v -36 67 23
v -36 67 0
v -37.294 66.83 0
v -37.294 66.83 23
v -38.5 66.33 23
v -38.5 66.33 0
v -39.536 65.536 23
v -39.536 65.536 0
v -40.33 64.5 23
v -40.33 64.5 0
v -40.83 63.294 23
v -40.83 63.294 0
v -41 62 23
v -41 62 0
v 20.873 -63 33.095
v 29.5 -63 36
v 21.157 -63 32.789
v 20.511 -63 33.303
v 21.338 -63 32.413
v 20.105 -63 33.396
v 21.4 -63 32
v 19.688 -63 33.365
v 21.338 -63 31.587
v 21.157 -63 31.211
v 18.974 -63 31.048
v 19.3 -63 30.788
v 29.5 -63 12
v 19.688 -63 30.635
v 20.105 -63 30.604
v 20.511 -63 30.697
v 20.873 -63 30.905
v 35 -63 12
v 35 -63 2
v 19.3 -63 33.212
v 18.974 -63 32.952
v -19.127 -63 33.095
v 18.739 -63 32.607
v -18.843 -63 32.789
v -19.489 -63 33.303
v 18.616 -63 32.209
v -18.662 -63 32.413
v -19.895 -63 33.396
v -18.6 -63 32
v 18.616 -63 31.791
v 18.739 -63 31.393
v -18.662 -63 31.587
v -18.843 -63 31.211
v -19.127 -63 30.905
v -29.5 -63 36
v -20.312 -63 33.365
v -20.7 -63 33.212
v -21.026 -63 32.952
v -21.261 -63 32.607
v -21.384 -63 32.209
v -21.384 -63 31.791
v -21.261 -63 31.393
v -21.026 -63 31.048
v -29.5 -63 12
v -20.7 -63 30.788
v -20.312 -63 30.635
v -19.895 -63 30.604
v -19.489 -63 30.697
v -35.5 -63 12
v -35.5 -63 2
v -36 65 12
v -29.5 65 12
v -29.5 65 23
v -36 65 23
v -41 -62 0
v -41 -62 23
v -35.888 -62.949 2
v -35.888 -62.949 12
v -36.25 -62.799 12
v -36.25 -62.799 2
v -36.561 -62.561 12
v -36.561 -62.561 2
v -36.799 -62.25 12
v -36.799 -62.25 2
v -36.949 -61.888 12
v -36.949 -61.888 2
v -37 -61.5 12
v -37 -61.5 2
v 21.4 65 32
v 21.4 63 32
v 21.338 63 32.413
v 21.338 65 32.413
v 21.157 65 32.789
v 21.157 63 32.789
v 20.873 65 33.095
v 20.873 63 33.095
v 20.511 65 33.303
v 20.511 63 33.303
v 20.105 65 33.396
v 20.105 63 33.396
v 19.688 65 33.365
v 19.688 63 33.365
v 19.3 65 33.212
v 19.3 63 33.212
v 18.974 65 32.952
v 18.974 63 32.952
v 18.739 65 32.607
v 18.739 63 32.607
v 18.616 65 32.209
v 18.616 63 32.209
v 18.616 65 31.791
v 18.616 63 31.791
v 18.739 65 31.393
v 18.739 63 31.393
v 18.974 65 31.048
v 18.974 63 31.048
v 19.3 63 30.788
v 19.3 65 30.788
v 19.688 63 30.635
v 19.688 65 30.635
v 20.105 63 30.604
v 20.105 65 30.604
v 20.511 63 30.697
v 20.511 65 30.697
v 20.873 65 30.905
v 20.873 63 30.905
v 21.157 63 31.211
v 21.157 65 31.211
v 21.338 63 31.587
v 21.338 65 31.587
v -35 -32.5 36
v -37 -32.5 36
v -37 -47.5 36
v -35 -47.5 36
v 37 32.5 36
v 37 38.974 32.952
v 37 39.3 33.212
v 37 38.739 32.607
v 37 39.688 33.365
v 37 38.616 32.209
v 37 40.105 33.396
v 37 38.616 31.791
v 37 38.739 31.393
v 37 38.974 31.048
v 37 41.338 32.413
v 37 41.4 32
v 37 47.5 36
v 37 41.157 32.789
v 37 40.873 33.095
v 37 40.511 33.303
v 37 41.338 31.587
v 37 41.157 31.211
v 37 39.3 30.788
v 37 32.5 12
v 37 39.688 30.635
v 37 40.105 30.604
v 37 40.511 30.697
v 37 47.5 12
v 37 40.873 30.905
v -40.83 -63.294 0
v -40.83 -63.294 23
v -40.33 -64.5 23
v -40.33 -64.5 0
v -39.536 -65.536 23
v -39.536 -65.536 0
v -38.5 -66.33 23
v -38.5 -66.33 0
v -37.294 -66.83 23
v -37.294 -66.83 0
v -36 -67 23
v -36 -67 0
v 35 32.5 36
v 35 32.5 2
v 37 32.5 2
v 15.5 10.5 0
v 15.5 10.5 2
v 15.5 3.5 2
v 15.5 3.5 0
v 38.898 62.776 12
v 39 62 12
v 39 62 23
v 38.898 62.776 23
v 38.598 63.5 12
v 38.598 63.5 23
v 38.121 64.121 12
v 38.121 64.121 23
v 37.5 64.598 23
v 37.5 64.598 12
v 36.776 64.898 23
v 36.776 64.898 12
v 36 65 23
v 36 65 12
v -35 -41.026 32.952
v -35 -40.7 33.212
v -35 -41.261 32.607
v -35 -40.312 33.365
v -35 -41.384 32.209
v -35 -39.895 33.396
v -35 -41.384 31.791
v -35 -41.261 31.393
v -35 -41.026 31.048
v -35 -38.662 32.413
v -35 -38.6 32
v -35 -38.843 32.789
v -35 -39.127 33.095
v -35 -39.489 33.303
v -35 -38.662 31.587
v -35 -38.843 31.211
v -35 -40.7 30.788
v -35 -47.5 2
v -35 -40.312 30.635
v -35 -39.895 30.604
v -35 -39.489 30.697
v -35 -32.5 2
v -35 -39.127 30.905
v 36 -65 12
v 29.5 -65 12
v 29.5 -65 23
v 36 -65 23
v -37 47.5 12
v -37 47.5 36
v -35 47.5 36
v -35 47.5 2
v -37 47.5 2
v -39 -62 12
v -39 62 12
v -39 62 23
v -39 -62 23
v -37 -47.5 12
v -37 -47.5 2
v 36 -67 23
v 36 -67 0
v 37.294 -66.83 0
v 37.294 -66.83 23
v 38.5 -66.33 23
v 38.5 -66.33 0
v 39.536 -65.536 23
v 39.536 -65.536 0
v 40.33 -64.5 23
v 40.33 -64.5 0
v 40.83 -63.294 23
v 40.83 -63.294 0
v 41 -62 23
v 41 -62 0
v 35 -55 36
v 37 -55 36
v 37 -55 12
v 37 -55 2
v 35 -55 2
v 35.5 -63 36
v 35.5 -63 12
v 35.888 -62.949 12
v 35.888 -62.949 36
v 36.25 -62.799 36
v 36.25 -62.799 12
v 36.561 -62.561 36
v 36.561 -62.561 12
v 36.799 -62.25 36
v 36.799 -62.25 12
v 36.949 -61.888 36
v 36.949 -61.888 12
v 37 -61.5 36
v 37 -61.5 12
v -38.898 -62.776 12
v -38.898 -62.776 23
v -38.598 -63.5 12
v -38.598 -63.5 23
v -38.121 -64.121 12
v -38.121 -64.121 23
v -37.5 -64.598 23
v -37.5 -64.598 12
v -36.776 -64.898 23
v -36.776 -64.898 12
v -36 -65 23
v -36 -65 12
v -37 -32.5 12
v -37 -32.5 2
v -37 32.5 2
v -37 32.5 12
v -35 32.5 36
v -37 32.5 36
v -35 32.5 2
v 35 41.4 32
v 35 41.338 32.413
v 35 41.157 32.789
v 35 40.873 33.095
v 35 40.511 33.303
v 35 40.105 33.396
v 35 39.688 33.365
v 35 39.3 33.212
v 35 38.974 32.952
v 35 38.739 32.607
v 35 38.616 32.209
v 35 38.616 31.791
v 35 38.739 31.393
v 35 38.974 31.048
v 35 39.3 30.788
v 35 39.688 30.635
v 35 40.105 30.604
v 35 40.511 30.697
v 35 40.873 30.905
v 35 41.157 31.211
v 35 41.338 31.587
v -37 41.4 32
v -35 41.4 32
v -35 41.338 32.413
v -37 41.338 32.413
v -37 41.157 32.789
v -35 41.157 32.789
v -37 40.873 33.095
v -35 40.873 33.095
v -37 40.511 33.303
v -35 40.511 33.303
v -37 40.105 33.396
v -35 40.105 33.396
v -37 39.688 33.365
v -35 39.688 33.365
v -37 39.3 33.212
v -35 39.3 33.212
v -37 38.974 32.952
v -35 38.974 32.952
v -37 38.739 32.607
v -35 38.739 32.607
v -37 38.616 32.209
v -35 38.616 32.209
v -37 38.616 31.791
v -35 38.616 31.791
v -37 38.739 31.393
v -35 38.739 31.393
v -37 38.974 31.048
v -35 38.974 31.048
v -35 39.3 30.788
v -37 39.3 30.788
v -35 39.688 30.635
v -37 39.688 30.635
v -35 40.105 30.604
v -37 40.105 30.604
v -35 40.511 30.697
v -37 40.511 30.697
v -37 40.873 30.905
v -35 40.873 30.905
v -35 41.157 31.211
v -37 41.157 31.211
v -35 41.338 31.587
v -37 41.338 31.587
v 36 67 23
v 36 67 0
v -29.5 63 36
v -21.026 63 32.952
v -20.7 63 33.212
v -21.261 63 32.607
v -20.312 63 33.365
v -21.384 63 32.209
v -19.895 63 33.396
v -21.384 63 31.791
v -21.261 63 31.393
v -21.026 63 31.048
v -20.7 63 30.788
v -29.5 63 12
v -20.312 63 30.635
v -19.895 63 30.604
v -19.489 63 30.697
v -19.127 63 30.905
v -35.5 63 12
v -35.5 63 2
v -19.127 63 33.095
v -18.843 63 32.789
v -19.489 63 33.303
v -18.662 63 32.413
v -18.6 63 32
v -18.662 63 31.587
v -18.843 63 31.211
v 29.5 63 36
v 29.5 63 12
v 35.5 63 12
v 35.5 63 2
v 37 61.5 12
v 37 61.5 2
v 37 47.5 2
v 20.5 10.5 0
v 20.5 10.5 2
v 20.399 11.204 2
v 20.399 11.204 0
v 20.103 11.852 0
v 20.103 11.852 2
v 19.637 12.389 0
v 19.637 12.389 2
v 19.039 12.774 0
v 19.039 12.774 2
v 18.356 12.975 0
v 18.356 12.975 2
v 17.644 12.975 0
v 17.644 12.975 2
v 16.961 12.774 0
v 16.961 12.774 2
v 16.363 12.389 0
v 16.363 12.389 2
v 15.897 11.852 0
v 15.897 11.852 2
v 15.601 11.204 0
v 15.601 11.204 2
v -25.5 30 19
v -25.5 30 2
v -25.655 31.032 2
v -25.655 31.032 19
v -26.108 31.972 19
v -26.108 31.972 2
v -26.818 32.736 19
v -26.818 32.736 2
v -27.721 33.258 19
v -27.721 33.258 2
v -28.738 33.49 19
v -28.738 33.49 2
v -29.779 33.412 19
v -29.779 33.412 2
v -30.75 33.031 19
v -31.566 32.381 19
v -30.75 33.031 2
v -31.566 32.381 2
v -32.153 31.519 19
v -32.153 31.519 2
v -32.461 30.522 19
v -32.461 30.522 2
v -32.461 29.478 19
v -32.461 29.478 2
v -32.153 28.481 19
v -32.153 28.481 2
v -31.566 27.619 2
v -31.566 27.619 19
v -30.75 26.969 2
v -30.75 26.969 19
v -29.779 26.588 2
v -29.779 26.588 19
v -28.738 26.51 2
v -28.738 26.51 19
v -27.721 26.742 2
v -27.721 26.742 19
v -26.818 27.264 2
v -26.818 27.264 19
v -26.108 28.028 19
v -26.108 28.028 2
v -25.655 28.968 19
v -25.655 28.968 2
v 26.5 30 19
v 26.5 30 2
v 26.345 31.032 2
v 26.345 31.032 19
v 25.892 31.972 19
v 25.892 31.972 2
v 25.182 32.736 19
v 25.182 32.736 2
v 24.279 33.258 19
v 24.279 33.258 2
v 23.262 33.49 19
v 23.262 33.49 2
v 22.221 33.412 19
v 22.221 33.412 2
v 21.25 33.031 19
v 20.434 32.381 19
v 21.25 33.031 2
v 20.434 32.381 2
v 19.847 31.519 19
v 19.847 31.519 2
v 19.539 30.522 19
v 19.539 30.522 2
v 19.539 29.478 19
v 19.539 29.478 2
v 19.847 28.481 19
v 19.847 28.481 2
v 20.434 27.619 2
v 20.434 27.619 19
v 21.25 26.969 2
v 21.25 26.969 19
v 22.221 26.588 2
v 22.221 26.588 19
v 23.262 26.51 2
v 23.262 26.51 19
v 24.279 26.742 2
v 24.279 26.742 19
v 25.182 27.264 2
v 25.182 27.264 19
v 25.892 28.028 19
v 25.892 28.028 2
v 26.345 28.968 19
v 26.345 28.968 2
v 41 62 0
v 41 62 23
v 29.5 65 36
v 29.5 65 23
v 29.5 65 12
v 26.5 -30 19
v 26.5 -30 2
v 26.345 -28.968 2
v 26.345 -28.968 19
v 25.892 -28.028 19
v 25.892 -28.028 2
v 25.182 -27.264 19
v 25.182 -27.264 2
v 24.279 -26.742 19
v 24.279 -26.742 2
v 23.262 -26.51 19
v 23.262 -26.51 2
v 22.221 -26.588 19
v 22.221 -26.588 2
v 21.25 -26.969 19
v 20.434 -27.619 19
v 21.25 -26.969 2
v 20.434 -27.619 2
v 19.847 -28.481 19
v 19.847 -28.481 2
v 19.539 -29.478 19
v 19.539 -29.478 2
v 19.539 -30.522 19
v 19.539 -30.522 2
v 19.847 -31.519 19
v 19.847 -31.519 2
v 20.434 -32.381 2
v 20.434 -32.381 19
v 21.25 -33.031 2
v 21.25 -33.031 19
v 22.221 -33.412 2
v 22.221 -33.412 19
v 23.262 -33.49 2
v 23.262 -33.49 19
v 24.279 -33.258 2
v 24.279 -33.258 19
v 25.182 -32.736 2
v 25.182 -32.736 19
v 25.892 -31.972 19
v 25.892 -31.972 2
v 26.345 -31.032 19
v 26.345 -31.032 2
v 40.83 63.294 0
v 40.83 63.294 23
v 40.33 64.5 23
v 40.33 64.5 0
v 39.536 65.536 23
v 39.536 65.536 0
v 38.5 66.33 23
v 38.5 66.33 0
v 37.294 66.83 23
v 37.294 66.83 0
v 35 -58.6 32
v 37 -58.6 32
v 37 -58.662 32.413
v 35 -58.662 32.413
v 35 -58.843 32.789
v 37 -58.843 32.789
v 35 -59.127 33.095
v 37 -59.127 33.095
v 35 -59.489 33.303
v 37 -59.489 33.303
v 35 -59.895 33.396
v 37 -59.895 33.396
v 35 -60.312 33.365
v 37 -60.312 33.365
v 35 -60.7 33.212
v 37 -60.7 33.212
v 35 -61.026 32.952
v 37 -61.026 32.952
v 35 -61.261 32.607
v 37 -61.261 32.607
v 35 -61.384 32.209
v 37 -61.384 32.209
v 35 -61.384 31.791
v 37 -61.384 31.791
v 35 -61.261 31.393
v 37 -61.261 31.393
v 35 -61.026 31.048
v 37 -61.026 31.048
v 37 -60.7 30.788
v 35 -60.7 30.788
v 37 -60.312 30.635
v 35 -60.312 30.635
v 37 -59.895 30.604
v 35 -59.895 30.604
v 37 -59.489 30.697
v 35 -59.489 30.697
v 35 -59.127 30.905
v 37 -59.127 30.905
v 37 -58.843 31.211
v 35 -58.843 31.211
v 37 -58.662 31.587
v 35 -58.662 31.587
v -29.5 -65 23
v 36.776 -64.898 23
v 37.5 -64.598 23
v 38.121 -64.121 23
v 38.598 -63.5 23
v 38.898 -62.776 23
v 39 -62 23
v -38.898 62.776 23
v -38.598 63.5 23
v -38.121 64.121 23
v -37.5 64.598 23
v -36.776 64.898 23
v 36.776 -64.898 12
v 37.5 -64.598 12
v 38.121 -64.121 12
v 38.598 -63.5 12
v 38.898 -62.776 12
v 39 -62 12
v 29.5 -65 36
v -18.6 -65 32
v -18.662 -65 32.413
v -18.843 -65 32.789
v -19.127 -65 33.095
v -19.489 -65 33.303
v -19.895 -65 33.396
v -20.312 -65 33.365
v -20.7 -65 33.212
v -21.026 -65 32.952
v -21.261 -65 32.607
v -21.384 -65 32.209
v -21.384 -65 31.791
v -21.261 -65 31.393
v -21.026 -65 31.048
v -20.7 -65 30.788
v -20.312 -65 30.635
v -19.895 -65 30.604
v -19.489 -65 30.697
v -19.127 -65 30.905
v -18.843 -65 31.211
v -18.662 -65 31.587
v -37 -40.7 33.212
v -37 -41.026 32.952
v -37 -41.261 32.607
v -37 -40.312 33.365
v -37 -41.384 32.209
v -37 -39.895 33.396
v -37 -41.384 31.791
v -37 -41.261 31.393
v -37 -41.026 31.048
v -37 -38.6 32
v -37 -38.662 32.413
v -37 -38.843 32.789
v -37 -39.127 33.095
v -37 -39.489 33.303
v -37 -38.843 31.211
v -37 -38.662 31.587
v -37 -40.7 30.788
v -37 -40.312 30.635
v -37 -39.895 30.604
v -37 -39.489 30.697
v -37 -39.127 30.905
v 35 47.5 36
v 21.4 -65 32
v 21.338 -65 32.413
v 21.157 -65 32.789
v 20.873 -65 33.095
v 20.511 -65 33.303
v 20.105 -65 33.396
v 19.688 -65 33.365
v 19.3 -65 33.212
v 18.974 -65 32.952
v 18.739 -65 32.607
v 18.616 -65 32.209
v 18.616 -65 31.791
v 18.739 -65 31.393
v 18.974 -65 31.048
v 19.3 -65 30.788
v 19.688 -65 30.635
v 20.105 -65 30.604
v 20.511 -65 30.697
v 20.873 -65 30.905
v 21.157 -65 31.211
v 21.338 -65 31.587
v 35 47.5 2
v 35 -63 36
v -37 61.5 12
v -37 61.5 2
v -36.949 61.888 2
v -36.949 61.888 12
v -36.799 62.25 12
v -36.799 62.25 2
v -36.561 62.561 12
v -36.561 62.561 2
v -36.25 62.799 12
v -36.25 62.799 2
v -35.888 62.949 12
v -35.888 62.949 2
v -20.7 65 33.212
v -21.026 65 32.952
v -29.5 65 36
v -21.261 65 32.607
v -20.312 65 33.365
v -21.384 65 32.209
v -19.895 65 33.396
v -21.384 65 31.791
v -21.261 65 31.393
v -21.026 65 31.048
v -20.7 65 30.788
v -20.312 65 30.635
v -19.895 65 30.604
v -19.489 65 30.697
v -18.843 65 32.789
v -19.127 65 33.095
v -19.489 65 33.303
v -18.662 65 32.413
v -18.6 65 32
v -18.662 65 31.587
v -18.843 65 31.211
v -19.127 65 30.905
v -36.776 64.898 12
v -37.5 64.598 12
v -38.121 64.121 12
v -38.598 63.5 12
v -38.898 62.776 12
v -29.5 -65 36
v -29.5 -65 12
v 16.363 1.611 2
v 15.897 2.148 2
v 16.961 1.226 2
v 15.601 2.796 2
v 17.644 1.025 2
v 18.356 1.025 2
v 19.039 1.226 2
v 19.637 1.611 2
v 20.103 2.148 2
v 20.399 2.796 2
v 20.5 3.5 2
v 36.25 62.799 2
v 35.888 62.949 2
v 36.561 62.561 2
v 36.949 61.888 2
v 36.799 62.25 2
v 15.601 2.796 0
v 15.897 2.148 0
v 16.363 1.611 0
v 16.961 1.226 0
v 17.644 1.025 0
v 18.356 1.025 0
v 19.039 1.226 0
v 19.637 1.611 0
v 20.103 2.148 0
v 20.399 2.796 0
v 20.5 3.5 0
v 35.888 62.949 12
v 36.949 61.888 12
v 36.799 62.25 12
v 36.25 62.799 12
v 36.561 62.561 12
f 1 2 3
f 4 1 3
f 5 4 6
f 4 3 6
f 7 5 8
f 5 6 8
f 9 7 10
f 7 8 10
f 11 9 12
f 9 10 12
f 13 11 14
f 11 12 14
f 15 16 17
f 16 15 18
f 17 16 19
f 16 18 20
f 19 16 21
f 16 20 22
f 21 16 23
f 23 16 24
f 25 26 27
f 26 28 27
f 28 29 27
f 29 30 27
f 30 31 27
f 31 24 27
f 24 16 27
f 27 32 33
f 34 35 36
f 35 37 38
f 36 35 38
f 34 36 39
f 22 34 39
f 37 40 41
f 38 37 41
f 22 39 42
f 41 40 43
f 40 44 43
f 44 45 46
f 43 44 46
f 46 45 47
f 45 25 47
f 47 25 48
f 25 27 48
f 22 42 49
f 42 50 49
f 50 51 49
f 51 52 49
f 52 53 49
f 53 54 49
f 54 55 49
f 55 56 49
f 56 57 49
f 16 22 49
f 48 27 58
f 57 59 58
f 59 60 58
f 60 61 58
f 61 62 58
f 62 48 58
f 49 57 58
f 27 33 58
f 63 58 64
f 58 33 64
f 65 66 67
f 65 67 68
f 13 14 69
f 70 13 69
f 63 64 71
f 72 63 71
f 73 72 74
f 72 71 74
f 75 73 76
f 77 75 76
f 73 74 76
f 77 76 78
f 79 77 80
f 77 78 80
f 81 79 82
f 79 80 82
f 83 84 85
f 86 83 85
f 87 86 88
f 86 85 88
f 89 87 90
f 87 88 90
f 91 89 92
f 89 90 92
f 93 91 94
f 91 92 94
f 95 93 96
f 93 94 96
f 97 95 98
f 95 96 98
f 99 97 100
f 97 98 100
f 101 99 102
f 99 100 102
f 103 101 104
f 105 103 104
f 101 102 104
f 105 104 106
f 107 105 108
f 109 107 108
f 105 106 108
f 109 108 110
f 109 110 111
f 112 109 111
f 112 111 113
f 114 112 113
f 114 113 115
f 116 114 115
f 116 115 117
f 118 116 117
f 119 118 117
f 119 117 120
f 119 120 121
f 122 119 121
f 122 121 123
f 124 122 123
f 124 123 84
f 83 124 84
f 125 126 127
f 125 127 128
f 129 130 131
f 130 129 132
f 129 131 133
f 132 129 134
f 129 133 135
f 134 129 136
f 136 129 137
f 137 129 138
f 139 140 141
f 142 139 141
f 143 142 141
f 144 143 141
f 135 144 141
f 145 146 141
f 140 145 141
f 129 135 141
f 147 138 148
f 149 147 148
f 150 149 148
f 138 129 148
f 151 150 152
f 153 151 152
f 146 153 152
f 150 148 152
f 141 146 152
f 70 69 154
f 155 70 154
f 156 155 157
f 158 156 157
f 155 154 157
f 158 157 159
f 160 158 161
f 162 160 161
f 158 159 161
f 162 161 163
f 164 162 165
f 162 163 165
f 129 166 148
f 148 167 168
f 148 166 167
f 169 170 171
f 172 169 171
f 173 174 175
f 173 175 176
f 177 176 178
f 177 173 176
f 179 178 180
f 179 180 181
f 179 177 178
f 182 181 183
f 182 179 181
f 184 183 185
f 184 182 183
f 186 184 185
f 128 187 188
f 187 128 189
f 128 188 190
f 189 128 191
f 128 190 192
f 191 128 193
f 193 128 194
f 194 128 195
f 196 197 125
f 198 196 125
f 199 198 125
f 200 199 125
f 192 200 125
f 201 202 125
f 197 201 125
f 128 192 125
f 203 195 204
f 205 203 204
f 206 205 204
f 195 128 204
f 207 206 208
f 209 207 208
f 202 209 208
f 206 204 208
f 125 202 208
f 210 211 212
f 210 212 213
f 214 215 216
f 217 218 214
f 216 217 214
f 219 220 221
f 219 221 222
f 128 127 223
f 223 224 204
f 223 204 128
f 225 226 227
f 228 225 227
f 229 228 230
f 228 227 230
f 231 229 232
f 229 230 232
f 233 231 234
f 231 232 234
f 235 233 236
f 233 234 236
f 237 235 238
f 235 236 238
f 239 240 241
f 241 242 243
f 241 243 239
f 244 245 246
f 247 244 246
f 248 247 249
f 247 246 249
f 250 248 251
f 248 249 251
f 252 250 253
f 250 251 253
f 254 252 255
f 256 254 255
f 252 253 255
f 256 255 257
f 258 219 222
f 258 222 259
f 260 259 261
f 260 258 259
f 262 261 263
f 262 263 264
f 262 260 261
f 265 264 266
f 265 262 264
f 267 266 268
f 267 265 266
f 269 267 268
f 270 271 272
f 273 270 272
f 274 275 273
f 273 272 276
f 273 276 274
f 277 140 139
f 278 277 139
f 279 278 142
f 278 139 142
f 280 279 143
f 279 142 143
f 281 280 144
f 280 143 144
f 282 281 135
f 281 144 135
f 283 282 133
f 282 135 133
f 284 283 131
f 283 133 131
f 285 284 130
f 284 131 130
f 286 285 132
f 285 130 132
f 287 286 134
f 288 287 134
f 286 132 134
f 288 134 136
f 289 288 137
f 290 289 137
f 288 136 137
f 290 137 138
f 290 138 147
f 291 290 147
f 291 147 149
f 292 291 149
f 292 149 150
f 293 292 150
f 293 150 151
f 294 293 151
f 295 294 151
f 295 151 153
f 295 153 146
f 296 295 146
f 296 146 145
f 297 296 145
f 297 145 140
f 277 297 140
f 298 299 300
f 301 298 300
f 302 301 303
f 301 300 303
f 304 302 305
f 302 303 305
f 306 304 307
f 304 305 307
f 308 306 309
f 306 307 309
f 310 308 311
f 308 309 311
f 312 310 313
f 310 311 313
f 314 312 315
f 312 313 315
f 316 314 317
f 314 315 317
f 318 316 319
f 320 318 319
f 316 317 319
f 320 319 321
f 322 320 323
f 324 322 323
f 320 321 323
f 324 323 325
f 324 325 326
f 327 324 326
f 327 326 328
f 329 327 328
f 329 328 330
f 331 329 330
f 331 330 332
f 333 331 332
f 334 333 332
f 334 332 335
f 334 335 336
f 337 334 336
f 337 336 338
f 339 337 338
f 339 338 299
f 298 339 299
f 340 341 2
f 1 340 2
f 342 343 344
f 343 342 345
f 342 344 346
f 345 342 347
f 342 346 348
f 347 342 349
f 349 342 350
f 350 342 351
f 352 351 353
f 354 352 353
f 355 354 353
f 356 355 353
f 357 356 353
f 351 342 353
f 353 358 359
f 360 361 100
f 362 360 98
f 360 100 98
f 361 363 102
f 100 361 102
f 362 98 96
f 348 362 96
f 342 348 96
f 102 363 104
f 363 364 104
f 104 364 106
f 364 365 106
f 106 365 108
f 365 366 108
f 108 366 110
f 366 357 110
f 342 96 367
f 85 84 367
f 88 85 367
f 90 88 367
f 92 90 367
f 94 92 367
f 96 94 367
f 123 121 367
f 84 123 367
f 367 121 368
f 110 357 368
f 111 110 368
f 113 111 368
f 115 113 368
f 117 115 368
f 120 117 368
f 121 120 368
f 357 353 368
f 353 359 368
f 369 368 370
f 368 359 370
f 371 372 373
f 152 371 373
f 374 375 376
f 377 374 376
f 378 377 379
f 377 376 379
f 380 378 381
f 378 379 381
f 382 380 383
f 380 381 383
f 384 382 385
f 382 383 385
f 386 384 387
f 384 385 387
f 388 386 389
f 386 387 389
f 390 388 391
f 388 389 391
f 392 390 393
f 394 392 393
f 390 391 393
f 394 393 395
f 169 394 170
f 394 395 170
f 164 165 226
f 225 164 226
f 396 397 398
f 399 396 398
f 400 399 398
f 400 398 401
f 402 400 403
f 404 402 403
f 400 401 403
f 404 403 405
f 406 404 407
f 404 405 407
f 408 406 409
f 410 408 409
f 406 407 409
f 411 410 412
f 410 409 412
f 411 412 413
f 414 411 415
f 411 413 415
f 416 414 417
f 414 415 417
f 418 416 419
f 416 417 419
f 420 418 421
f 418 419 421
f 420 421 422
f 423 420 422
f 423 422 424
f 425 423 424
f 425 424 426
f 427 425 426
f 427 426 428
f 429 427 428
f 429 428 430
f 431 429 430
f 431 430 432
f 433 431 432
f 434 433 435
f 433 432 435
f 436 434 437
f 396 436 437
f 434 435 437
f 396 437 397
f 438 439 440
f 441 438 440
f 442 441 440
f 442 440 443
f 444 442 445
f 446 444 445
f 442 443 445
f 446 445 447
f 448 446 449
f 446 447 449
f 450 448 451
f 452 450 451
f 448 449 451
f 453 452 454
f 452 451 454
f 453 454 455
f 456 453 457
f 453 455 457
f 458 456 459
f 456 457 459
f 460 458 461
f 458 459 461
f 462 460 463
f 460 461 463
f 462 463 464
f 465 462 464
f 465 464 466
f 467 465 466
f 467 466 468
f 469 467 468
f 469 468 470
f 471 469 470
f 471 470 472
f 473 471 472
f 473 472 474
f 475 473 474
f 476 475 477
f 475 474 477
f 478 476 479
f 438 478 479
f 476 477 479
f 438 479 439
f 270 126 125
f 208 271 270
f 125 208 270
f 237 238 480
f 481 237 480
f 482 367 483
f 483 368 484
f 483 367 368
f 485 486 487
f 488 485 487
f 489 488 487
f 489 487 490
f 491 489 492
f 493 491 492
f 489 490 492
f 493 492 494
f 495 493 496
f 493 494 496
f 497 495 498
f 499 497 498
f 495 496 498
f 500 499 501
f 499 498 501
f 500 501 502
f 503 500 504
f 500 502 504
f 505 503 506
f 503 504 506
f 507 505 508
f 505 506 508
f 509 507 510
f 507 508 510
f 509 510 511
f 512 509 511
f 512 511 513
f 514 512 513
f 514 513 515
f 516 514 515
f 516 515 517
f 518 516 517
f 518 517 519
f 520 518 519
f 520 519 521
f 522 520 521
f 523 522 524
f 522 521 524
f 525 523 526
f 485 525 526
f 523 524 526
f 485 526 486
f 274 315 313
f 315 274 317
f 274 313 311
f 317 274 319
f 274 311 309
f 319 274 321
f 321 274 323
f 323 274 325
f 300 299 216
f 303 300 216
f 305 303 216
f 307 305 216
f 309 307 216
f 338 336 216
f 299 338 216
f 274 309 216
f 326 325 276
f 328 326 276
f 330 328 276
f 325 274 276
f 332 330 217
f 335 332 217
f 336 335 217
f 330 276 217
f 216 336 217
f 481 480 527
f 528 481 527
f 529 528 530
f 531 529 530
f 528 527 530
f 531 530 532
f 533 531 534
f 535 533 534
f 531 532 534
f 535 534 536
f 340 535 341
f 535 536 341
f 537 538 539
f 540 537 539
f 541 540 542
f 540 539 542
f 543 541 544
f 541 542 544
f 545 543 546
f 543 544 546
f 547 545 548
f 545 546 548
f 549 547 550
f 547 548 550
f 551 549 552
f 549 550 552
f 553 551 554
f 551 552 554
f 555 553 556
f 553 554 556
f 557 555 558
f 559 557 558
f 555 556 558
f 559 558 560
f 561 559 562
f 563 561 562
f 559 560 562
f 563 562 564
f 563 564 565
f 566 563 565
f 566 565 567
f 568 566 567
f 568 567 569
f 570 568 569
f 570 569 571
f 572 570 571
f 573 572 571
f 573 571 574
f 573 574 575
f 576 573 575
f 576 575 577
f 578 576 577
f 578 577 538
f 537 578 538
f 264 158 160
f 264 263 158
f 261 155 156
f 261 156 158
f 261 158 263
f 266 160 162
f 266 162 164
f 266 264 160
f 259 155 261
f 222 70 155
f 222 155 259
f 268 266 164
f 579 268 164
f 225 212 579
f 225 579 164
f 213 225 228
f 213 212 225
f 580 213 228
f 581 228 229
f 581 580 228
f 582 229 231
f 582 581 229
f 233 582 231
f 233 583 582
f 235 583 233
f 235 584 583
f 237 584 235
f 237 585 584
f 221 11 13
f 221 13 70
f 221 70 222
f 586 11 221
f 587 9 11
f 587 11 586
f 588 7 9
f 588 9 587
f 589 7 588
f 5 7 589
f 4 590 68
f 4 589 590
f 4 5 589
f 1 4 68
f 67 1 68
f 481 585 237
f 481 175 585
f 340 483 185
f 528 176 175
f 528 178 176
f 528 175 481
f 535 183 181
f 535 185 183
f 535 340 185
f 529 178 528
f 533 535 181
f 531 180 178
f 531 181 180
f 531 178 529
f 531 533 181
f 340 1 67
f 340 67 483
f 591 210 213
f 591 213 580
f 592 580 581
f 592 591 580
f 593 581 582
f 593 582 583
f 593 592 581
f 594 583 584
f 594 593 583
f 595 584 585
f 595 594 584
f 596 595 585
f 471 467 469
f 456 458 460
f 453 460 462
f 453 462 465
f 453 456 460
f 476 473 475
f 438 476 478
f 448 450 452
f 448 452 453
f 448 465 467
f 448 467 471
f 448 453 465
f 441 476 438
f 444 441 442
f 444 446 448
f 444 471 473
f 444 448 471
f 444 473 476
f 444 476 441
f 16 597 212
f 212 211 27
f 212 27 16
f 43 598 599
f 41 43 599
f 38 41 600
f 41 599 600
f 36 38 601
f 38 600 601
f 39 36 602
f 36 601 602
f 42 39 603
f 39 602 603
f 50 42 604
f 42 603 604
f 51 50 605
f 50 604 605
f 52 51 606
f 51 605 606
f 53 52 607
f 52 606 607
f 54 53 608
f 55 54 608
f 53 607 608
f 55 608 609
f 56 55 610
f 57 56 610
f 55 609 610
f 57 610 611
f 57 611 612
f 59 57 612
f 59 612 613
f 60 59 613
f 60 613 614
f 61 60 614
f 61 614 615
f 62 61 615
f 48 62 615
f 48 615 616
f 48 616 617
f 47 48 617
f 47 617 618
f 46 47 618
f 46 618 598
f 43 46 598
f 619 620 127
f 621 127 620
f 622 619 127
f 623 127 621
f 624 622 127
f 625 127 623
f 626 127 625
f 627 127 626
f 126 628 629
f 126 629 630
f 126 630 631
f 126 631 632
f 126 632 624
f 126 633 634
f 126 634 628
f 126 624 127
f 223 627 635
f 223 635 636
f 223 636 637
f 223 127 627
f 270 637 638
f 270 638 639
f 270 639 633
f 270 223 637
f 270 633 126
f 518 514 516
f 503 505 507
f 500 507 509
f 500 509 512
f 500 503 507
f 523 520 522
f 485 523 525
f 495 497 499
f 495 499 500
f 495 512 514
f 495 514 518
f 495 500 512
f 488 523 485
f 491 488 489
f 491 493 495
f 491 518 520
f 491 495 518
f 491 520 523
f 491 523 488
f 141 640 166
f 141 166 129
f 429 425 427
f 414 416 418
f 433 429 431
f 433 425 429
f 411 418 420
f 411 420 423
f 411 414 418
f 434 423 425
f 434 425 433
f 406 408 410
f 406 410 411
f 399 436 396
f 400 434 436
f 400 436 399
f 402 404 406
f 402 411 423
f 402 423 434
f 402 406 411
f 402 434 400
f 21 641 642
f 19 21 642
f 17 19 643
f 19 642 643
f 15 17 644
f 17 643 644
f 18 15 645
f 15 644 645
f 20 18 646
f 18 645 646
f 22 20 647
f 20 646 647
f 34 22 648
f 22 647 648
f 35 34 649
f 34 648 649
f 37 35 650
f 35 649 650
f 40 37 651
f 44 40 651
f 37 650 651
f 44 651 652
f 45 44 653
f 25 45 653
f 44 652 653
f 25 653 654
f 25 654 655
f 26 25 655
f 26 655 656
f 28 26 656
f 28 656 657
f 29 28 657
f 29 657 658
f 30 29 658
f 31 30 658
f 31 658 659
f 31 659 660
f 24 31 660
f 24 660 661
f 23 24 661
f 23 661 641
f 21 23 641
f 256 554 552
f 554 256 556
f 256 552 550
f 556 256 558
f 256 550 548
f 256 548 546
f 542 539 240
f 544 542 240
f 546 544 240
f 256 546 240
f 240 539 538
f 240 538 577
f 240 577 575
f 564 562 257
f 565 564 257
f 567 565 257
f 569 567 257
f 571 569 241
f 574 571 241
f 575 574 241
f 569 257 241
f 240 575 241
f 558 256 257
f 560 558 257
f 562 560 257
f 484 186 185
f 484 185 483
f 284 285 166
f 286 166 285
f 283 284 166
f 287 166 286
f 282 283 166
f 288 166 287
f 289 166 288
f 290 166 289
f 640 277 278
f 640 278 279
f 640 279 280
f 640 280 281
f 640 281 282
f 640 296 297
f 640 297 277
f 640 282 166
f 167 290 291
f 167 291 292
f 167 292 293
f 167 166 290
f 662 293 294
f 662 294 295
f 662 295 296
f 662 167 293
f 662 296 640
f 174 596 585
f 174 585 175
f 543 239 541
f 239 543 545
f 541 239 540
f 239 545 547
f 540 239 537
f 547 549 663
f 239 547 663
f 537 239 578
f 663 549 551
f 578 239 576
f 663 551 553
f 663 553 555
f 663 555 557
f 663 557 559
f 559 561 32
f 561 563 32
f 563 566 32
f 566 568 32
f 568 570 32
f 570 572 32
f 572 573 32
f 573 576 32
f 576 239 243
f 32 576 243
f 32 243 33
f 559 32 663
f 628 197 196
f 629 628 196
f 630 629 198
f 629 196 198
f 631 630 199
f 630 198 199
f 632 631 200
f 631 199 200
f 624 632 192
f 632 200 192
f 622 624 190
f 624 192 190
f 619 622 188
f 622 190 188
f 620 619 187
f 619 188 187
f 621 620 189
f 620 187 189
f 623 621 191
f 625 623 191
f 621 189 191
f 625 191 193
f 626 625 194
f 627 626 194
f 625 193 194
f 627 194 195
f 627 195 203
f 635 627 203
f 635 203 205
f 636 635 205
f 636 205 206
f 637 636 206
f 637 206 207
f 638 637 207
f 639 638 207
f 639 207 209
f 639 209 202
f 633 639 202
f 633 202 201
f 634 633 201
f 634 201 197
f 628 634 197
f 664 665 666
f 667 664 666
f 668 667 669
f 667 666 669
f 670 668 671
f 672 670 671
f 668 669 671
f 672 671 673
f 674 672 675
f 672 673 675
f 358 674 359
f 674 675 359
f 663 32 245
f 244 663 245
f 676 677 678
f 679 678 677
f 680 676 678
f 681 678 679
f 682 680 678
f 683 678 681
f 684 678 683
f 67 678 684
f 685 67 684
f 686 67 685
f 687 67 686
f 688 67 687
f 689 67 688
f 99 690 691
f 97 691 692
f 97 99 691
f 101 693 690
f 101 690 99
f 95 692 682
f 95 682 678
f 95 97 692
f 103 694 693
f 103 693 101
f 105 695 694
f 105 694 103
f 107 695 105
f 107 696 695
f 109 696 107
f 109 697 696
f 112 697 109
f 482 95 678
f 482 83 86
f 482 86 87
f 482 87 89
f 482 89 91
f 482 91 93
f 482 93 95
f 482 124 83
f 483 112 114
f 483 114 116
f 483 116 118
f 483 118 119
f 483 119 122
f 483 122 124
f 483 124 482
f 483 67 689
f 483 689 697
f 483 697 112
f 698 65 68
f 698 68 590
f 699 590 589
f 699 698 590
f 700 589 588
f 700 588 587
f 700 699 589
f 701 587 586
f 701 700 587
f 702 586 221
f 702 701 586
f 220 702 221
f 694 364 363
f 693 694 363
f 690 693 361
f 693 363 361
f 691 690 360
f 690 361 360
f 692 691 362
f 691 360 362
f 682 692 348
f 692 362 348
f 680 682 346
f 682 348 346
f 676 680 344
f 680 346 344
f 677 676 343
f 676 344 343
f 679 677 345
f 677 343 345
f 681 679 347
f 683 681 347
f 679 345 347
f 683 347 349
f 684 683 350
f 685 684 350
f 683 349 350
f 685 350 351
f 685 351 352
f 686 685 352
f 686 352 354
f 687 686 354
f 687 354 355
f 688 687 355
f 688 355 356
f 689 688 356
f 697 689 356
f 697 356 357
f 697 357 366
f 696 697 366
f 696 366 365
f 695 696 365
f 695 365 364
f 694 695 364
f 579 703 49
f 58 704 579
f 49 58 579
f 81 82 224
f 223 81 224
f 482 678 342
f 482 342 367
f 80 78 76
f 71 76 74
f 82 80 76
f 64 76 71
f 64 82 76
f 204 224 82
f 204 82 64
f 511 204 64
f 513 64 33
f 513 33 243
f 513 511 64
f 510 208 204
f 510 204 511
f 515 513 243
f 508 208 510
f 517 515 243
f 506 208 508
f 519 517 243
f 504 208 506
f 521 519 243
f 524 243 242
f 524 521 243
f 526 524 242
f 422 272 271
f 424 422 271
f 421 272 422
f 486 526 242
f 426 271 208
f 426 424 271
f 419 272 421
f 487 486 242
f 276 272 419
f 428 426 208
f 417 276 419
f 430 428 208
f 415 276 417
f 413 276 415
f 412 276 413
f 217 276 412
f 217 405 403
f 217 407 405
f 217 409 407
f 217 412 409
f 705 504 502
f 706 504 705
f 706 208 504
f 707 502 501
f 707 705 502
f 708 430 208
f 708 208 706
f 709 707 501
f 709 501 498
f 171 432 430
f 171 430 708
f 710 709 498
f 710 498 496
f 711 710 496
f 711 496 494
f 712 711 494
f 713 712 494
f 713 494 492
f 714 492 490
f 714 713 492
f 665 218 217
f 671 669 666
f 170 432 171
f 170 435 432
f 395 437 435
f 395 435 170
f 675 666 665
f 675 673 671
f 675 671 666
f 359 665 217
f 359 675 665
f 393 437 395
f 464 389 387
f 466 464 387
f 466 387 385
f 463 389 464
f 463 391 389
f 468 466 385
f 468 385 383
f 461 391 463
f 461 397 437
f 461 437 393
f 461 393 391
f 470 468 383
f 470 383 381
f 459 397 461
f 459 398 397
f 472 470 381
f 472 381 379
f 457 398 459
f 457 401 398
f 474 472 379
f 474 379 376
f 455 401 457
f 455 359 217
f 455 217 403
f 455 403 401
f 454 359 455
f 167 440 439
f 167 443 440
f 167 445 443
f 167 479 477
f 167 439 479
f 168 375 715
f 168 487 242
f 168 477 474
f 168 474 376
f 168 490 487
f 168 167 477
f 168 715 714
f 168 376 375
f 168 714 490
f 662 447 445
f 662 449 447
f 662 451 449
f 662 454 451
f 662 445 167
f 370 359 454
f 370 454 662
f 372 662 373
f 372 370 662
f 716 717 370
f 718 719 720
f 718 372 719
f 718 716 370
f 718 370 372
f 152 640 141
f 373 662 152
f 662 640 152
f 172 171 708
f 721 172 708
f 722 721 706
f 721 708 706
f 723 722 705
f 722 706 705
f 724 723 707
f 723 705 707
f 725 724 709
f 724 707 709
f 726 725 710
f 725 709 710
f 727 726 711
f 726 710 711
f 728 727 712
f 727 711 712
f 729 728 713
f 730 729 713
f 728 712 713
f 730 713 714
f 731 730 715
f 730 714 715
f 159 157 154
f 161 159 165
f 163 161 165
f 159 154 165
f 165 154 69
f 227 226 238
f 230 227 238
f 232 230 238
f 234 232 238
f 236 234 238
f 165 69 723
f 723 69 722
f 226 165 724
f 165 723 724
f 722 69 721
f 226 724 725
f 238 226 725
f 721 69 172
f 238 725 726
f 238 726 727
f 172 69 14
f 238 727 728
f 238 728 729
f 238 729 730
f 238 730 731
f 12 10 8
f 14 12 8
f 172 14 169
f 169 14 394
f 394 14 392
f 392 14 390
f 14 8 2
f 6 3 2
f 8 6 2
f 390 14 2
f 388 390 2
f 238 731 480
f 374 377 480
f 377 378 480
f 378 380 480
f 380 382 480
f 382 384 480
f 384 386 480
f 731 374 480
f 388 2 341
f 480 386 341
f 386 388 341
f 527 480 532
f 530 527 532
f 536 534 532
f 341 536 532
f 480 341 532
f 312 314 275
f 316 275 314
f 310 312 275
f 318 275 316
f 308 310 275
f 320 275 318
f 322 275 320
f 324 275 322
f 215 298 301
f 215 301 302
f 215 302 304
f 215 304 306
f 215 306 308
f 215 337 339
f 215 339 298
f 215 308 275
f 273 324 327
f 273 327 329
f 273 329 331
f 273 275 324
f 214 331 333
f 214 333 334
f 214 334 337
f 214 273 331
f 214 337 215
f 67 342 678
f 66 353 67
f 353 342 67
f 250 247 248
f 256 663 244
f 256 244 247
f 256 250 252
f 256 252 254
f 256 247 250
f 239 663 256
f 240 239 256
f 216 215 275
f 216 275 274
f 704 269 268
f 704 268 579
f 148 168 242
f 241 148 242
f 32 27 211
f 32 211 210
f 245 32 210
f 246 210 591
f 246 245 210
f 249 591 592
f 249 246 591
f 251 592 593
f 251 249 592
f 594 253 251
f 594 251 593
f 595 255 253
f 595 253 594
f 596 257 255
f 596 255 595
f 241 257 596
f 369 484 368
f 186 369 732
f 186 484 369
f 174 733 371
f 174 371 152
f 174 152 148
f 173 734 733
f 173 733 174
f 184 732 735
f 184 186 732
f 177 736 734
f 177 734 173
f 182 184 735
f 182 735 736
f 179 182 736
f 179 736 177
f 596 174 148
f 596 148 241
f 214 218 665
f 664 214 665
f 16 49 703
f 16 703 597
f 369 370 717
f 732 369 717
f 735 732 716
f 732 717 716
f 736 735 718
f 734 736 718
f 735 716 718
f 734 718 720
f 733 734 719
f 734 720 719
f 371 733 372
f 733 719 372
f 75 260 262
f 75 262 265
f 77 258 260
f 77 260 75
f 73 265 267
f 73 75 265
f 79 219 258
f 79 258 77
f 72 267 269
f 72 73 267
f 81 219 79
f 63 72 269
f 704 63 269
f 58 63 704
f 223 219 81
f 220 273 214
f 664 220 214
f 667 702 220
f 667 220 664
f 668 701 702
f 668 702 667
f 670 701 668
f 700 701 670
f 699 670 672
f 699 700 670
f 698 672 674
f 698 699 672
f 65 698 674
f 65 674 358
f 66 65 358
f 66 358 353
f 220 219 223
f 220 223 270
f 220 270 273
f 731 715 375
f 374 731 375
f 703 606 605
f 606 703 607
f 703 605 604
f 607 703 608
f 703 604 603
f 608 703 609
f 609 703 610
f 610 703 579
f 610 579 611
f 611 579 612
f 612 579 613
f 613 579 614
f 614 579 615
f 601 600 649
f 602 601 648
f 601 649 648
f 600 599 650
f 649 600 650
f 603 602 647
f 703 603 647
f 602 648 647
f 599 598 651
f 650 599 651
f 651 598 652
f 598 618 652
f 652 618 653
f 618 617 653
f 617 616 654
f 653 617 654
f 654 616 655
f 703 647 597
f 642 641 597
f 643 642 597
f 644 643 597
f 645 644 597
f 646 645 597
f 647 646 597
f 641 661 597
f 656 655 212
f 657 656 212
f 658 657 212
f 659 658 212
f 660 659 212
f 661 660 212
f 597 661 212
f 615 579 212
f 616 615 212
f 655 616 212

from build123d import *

# Parameters (mm, degrees)
F1_DEPTH  = 23
F2_T      = -2
F3_R      = 3.5
F4_DEPTH  = 17
F5_DEPTH  = 2
F6_DEPTH  = 10
F7_W      = 59
F7_H      = 2
F7_W_2    = 2
F7_H_2    = 15
F8_DEPTH  = 34
F9_R      = 1.4
F10_DEPTH = 132.001
F11_R     = 1.4
F12_DEPTH = 78.001


with BuildPart() as f1:
    # F0 (on Top) → F1 (new body)
    with BuildSketch(Plane.XY):
        with BuildLine():
            Line((-36, -67), (36, -67))
            ThreePointArc((36, -67), (39.5355339059, -65.5355339059), (41, -62))
            Line((41, -62), (41, 62))
            ThreePointArc((41, 62), (39.5355339059, 65.5355339059), (36, 67))
            Line((36, 67), (-36, 67))
            ThreePointArc((-36, 67), (-39.5355339059, 65.5355339059), (-41, 62))
            Line((-41, 62), (-41, -62))
            ThreePointArc((-41, -62), (-39.5355339059, -65.5355339059), (-36, -67))
        make_face()
    extrude(amount=F1_DEPTH)

    # F2
    f2_openings = [f1.faces().sort_by_distance(p)[0] for p in [
        (0, 0, 23),
    ]]
    offset(amount=F2_T, openings=f2_openings)

    # F3 (on face) → F4 (join)
    with BuildSketch(Plane.XY.offset(2)):
        with Locations((-29, 30)):
            Circle(F3_R)
        with Locations((23, 30)):
            Circle(F3_R)
        with Locations((23, -30)):
            Circle(F3_R)
    extrude(amount=F4_DEPTH)

    # F3 (on face) → F5 (cut)
    with BuildSketch(Plane.XY.offset(2)):
        with BuildLine():
            ThreePointArc((15.5, 3.5), (18, 1), (20.5, 3.5))
            Line((20.5, 3.5), (20.5, 10.5))
            ThreePointArc((20.5, 10.5), (18, 13), (15.5, 10.5))
            Line((15.5, 10.5), (15.5, 3.5))
        make_face()
    extrude(amount=-F5_DEPTH, mode=Mode.SUBTRACT)

    # F3 (on face) → F6 (join)
    with BuildSketch(Plane.XY.offset(2)):
        with BuildLine():
            Line((-36, -65), (36, -65))
            ThreePointArc((36, -65), (38.1213203436, -64.1213203436), (39, -62))
            Line((39, -62), (39, 62))
            ThreePointArc((39, 62), (38.1213203436, 64.1213203436), (36, 65))
            Line((36, 65), (-36, 65))
            ThreePointArc((-36, 65), (-38.1213203436, 64.1213203436), (-39, 62))
            Line((-39, 62), (-39, -62))
            ThreePointArc((-39, -62), (-38.1213203436, -64.1213203436), (-36, -65))
        make_face()
        with BuildLine():
            ThreePointArc((37, -61.5), (36.5606601718, -62.5606601718), (35.5, -63))
            Line((35.5, -63), (-35.5, -63))
            ThreePointArc((-35.5, -63), (-36.5606601718, -62.5606601718), (-37, -61.5))
            Line((-37, -61.5), (-37, 61.5))
            ThreePointArc((-37, 61.5), (-36.5606601718, 62.5606601718), (-35.5, 63))
            Line((-35.5, 63), (35.5, 63))
            ThreePointArc((35.5, 63), (36.5606601718, 62.5606601718), (37, 61.5))
            Line((37, 61.5), (37, -61.5))
        make_face(mode=Mode.SUBTRACT)
    extrude(amount=F6_DEPTH)

    # F7 (on face) → F8 (join)
    with BuildSketch(Plane.XY.offset(2)):
        with Locations((0, 64)):
            Rectangle(F7_W, F7_H)
        with Locations((0, -64)):
            Rectangle(F7_W, F7_H)
        with Locations((-36, 40)):
            Rectangle(F7_W_2, F7_H_2)
        with Locations((-36, -40)):
            Rectangle(F7_W_2, F7_H_2)
        with Locations((36, 40)):
            Rectangle(F7_W_2, F7_H_2)
        with BuildLine():
            Line((37, -61.5), (37, -55))
            Line((37, -55), (35, -55))
            Line((35, -55), (35, -63))
            Line((35, -63), (35.5, -63))
            ThreePointArc((35.5, -63), (36.5606601718, -62.5606601718), (37, -61.5))
        make_face()
    extrude(amount=F8_DEPTH)

    # F9 (on face) → F10 (cut, through all)
    with BuildSketch(Plane.XZ.offset(65)):
        with Locations((-20, 32)):
            Circle(F9_R)
        with Locations((20, 32)):
            Circle(F9_R)
    extrude(amount=-F10_DEPTH, mode=Mode.SUBTRACT)

    # F11 (on face) → F12 (cut, through all)
    with BuildSketch(Plane.YZ.offset(37)):
        with Locations((40, 32)):
            Circle(F11_R)
        with Locations((-40, 32)):
            Circle(F11_R)
        with Locations((-60, 32)):
            Circle(F11_R)
    extrude(amount=-F12_DEPTH, mode=Mode.SUBTRACT)


solid = f1.part
